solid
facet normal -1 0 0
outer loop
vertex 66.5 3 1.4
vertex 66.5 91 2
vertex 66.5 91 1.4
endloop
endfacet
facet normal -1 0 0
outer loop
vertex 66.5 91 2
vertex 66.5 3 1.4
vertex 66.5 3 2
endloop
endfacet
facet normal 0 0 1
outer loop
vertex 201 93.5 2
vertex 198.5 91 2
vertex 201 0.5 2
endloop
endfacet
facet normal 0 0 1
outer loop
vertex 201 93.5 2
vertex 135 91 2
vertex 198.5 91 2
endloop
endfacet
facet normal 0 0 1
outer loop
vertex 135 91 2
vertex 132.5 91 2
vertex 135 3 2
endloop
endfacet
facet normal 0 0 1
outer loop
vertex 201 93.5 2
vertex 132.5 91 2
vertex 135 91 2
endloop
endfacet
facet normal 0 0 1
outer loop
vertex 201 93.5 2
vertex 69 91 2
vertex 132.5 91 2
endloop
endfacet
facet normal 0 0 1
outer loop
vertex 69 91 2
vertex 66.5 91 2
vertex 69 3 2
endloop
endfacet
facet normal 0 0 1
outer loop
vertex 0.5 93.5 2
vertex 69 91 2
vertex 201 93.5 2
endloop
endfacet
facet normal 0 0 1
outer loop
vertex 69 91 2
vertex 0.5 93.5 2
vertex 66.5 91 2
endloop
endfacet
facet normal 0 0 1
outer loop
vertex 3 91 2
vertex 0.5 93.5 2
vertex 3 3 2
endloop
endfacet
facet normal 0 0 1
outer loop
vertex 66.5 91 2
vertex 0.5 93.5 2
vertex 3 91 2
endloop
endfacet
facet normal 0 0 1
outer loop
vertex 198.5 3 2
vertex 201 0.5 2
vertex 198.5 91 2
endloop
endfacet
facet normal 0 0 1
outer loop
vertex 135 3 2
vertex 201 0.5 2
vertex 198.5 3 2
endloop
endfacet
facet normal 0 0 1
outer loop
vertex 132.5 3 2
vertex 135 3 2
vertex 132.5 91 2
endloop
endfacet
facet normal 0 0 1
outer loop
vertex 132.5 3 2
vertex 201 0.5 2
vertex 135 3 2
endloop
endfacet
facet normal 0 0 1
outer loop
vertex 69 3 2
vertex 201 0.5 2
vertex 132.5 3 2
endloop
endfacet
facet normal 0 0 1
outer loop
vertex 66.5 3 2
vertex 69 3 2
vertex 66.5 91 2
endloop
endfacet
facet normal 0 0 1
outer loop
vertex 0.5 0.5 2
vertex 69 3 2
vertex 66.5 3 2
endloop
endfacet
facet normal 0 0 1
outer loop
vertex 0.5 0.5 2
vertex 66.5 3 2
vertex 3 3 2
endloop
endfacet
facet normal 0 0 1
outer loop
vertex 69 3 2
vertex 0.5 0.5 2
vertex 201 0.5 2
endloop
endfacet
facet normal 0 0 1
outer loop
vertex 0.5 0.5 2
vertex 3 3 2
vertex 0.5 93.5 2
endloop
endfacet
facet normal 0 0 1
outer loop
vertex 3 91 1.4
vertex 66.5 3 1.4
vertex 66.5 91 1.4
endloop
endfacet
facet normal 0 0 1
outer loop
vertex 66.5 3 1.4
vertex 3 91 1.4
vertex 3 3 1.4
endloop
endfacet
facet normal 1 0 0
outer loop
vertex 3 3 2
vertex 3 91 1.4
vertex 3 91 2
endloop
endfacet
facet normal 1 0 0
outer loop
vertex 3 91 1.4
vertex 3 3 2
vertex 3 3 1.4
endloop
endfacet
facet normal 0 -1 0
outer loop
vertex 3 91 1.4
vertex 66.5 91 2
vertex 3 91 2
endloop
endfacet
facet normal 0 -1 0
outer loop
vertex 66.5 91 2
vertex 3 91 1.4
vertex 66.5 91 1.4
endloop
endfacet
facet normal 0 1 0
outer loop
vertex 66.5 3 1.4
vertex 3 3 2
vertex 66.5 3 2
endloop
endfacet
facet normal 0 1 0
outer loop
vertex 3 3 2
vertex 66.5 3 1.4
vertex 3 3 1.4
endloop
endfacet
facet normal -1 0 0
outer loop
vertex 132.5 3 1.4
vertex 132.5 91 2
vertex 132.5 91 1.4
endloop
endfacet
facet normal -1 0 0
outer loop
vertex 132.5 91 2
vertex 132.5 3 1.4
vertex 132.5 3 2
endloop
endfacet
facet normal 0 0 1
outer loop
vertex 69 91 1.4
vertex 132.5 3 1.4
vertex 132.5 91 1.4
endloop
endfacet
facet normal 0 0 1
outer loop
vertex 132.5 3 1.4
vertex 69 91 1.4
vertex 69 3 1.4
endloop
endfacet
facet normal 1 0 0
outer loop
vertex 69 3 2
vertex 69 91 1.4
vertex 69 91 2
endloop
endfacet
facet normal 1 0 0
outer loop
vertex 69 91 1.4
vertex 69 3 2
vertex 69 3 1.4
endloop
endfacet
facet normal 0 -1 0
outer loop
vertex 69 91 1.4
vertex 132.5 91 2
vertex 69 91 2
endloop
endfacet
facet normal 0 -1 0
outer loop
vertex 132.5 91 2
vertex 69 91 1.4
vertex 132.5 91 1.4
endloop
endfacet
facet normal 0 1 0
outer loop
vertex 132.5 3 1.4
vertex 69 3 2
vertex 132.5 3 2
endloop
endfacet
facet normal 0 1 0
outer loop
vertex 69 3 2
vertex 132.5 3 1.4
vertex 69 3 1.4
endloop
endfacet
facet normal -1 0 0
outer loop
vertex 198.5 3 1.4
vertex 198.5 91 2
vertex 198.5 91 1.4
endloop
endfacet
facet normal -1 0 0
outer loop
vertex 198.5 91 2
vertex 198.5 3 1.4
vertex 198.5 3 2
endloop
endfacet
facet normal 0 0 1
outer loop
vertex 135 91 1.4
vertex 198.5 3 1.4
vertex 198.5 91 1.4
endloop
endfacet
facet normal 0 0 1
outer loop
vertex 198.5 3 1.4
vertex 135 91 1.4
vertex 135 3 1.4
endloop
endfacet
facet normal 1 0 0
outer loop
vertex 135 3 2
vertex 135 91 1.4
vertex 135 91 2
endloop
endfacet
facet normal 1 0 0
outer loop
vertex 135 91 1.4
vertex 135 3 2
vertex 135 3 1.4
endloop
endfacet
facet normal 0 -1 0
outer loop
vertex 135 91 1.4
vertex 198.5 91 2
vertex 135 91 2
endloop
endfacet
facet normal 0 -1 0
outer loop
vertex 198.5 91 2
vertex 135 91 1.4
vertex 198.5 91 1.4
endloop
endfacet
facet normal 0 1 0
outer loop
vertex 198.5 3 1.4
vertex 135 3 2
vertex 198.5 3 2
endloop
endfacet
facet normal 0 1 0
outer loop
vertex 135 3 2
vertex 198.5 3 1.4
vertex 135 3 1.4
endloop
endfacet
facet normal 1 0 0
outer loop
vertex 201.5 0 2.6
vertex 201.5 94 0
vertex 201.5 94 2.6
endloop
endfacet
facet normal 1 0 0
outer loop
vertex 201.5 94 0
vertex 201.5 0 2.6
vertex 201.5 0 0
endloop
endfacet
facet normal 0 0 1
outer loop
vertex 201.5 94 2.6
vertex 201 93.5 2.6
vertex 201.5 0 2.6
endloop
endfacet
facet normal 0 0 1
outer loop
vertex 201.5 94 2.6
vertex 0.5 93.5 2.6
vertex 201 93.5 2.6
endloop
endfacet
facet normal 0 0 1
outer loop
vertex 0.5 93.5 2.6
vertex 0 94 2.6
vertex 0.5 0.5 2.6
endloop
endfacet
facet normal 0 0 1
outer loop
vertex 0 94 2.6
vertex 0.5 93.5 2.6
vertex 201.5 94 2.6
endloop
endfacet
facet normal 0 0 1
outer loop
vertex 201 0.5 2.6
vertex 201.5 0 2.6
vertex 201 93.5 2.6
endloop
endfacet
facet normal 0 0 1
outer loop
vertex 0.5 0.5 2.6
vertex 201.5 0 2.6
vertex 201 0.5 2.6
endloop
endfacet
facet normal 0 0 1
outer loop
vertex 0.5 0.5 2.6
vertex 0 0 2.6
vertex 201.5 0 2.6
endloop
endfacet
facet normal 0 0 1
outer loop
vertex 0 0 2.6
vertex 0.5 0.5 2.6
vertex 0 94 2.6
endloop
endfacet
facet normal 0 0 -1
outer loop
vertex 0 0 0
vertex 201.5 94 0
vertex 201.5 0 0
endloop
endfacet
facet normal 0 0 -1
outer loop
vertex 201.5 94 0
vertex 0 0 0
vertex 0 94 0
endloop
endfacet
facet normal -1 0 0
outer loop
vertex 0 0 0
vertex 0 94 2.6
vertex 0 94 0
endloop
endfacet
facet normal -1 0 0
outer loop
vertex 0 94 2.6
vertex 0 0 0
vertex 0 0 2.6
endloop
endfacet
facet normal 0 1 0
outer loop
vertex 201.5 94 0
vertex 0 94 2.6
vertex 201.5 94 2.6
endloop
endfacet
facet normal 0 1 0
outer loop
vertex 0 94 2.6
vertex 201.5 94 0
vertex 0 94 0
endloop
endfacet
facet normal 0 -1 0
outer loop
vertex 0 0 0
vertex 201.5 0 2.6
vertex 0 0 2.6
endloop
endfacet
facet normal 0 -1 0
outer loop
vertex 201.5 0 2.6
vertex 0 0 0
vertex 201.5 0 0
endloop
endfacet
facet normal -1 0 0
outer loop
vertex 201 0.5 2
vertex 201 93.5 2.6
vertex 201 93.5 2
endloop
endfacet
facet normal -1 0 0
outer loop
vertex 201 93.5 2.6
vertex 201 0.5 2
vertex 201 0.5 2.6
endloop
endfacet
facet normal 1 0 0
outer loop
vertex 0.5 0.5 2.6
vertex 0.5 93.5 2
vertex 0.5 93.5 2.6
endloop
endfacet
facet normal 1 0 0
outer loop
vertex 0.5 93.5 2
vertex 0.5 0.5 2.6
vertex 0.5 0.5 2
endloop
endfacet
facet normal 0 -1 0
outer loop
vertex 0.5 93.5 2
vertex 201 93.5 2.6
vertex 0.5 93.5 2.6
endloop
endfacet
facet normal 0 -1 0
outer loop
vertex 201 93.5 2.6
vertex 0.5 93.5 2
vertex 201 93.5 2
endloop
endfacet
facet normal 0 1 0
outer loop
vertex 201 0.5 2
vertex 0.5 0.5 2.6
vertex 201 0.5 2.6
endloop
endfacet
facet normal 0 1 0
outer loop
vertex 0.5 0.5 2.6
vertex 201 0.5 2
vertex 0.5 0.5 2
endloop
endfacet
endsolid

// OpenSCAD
clearance_z = .6;

card_x = 63.5;
card_y = 88.0;
card_z = clearance_z;

inner_border = 2.5;
number_of_cards = 3;

inner_x = inner_border + (card_x * number_of_cards) + (inner_border * number_of_cards);
inner_y = card_y + (inner_border * 2);
inner_z = 2;

outer_border = 1;
outer_x = inner_x + outer_border;
outer_y = inner_y + outer_border;
outer_z = inner_z + clearance_z;

difference() {
    cube([outer_x, outer_y, outer_z]);
    translate([(outer_border / 2), (outer_border / 2), (outer_z - clearance_z)]) {
        cube([inner_x, inner_y, inner_z]);
    }
    
    for (i = [1 : number_of_cards]) {
        x_inset = (outer_border / 2) + (inner_border * i) +  (card_x * (i - 1));
        y_inset = (outer_border / 2) + inner_border;
        z_inset = outer_z - (clearance_z * 2);

        translate([x_inset, y_inset, (inner_z - card_z)]) {
            cube([card_x, card_y, card_z]);
        }
    }
}
